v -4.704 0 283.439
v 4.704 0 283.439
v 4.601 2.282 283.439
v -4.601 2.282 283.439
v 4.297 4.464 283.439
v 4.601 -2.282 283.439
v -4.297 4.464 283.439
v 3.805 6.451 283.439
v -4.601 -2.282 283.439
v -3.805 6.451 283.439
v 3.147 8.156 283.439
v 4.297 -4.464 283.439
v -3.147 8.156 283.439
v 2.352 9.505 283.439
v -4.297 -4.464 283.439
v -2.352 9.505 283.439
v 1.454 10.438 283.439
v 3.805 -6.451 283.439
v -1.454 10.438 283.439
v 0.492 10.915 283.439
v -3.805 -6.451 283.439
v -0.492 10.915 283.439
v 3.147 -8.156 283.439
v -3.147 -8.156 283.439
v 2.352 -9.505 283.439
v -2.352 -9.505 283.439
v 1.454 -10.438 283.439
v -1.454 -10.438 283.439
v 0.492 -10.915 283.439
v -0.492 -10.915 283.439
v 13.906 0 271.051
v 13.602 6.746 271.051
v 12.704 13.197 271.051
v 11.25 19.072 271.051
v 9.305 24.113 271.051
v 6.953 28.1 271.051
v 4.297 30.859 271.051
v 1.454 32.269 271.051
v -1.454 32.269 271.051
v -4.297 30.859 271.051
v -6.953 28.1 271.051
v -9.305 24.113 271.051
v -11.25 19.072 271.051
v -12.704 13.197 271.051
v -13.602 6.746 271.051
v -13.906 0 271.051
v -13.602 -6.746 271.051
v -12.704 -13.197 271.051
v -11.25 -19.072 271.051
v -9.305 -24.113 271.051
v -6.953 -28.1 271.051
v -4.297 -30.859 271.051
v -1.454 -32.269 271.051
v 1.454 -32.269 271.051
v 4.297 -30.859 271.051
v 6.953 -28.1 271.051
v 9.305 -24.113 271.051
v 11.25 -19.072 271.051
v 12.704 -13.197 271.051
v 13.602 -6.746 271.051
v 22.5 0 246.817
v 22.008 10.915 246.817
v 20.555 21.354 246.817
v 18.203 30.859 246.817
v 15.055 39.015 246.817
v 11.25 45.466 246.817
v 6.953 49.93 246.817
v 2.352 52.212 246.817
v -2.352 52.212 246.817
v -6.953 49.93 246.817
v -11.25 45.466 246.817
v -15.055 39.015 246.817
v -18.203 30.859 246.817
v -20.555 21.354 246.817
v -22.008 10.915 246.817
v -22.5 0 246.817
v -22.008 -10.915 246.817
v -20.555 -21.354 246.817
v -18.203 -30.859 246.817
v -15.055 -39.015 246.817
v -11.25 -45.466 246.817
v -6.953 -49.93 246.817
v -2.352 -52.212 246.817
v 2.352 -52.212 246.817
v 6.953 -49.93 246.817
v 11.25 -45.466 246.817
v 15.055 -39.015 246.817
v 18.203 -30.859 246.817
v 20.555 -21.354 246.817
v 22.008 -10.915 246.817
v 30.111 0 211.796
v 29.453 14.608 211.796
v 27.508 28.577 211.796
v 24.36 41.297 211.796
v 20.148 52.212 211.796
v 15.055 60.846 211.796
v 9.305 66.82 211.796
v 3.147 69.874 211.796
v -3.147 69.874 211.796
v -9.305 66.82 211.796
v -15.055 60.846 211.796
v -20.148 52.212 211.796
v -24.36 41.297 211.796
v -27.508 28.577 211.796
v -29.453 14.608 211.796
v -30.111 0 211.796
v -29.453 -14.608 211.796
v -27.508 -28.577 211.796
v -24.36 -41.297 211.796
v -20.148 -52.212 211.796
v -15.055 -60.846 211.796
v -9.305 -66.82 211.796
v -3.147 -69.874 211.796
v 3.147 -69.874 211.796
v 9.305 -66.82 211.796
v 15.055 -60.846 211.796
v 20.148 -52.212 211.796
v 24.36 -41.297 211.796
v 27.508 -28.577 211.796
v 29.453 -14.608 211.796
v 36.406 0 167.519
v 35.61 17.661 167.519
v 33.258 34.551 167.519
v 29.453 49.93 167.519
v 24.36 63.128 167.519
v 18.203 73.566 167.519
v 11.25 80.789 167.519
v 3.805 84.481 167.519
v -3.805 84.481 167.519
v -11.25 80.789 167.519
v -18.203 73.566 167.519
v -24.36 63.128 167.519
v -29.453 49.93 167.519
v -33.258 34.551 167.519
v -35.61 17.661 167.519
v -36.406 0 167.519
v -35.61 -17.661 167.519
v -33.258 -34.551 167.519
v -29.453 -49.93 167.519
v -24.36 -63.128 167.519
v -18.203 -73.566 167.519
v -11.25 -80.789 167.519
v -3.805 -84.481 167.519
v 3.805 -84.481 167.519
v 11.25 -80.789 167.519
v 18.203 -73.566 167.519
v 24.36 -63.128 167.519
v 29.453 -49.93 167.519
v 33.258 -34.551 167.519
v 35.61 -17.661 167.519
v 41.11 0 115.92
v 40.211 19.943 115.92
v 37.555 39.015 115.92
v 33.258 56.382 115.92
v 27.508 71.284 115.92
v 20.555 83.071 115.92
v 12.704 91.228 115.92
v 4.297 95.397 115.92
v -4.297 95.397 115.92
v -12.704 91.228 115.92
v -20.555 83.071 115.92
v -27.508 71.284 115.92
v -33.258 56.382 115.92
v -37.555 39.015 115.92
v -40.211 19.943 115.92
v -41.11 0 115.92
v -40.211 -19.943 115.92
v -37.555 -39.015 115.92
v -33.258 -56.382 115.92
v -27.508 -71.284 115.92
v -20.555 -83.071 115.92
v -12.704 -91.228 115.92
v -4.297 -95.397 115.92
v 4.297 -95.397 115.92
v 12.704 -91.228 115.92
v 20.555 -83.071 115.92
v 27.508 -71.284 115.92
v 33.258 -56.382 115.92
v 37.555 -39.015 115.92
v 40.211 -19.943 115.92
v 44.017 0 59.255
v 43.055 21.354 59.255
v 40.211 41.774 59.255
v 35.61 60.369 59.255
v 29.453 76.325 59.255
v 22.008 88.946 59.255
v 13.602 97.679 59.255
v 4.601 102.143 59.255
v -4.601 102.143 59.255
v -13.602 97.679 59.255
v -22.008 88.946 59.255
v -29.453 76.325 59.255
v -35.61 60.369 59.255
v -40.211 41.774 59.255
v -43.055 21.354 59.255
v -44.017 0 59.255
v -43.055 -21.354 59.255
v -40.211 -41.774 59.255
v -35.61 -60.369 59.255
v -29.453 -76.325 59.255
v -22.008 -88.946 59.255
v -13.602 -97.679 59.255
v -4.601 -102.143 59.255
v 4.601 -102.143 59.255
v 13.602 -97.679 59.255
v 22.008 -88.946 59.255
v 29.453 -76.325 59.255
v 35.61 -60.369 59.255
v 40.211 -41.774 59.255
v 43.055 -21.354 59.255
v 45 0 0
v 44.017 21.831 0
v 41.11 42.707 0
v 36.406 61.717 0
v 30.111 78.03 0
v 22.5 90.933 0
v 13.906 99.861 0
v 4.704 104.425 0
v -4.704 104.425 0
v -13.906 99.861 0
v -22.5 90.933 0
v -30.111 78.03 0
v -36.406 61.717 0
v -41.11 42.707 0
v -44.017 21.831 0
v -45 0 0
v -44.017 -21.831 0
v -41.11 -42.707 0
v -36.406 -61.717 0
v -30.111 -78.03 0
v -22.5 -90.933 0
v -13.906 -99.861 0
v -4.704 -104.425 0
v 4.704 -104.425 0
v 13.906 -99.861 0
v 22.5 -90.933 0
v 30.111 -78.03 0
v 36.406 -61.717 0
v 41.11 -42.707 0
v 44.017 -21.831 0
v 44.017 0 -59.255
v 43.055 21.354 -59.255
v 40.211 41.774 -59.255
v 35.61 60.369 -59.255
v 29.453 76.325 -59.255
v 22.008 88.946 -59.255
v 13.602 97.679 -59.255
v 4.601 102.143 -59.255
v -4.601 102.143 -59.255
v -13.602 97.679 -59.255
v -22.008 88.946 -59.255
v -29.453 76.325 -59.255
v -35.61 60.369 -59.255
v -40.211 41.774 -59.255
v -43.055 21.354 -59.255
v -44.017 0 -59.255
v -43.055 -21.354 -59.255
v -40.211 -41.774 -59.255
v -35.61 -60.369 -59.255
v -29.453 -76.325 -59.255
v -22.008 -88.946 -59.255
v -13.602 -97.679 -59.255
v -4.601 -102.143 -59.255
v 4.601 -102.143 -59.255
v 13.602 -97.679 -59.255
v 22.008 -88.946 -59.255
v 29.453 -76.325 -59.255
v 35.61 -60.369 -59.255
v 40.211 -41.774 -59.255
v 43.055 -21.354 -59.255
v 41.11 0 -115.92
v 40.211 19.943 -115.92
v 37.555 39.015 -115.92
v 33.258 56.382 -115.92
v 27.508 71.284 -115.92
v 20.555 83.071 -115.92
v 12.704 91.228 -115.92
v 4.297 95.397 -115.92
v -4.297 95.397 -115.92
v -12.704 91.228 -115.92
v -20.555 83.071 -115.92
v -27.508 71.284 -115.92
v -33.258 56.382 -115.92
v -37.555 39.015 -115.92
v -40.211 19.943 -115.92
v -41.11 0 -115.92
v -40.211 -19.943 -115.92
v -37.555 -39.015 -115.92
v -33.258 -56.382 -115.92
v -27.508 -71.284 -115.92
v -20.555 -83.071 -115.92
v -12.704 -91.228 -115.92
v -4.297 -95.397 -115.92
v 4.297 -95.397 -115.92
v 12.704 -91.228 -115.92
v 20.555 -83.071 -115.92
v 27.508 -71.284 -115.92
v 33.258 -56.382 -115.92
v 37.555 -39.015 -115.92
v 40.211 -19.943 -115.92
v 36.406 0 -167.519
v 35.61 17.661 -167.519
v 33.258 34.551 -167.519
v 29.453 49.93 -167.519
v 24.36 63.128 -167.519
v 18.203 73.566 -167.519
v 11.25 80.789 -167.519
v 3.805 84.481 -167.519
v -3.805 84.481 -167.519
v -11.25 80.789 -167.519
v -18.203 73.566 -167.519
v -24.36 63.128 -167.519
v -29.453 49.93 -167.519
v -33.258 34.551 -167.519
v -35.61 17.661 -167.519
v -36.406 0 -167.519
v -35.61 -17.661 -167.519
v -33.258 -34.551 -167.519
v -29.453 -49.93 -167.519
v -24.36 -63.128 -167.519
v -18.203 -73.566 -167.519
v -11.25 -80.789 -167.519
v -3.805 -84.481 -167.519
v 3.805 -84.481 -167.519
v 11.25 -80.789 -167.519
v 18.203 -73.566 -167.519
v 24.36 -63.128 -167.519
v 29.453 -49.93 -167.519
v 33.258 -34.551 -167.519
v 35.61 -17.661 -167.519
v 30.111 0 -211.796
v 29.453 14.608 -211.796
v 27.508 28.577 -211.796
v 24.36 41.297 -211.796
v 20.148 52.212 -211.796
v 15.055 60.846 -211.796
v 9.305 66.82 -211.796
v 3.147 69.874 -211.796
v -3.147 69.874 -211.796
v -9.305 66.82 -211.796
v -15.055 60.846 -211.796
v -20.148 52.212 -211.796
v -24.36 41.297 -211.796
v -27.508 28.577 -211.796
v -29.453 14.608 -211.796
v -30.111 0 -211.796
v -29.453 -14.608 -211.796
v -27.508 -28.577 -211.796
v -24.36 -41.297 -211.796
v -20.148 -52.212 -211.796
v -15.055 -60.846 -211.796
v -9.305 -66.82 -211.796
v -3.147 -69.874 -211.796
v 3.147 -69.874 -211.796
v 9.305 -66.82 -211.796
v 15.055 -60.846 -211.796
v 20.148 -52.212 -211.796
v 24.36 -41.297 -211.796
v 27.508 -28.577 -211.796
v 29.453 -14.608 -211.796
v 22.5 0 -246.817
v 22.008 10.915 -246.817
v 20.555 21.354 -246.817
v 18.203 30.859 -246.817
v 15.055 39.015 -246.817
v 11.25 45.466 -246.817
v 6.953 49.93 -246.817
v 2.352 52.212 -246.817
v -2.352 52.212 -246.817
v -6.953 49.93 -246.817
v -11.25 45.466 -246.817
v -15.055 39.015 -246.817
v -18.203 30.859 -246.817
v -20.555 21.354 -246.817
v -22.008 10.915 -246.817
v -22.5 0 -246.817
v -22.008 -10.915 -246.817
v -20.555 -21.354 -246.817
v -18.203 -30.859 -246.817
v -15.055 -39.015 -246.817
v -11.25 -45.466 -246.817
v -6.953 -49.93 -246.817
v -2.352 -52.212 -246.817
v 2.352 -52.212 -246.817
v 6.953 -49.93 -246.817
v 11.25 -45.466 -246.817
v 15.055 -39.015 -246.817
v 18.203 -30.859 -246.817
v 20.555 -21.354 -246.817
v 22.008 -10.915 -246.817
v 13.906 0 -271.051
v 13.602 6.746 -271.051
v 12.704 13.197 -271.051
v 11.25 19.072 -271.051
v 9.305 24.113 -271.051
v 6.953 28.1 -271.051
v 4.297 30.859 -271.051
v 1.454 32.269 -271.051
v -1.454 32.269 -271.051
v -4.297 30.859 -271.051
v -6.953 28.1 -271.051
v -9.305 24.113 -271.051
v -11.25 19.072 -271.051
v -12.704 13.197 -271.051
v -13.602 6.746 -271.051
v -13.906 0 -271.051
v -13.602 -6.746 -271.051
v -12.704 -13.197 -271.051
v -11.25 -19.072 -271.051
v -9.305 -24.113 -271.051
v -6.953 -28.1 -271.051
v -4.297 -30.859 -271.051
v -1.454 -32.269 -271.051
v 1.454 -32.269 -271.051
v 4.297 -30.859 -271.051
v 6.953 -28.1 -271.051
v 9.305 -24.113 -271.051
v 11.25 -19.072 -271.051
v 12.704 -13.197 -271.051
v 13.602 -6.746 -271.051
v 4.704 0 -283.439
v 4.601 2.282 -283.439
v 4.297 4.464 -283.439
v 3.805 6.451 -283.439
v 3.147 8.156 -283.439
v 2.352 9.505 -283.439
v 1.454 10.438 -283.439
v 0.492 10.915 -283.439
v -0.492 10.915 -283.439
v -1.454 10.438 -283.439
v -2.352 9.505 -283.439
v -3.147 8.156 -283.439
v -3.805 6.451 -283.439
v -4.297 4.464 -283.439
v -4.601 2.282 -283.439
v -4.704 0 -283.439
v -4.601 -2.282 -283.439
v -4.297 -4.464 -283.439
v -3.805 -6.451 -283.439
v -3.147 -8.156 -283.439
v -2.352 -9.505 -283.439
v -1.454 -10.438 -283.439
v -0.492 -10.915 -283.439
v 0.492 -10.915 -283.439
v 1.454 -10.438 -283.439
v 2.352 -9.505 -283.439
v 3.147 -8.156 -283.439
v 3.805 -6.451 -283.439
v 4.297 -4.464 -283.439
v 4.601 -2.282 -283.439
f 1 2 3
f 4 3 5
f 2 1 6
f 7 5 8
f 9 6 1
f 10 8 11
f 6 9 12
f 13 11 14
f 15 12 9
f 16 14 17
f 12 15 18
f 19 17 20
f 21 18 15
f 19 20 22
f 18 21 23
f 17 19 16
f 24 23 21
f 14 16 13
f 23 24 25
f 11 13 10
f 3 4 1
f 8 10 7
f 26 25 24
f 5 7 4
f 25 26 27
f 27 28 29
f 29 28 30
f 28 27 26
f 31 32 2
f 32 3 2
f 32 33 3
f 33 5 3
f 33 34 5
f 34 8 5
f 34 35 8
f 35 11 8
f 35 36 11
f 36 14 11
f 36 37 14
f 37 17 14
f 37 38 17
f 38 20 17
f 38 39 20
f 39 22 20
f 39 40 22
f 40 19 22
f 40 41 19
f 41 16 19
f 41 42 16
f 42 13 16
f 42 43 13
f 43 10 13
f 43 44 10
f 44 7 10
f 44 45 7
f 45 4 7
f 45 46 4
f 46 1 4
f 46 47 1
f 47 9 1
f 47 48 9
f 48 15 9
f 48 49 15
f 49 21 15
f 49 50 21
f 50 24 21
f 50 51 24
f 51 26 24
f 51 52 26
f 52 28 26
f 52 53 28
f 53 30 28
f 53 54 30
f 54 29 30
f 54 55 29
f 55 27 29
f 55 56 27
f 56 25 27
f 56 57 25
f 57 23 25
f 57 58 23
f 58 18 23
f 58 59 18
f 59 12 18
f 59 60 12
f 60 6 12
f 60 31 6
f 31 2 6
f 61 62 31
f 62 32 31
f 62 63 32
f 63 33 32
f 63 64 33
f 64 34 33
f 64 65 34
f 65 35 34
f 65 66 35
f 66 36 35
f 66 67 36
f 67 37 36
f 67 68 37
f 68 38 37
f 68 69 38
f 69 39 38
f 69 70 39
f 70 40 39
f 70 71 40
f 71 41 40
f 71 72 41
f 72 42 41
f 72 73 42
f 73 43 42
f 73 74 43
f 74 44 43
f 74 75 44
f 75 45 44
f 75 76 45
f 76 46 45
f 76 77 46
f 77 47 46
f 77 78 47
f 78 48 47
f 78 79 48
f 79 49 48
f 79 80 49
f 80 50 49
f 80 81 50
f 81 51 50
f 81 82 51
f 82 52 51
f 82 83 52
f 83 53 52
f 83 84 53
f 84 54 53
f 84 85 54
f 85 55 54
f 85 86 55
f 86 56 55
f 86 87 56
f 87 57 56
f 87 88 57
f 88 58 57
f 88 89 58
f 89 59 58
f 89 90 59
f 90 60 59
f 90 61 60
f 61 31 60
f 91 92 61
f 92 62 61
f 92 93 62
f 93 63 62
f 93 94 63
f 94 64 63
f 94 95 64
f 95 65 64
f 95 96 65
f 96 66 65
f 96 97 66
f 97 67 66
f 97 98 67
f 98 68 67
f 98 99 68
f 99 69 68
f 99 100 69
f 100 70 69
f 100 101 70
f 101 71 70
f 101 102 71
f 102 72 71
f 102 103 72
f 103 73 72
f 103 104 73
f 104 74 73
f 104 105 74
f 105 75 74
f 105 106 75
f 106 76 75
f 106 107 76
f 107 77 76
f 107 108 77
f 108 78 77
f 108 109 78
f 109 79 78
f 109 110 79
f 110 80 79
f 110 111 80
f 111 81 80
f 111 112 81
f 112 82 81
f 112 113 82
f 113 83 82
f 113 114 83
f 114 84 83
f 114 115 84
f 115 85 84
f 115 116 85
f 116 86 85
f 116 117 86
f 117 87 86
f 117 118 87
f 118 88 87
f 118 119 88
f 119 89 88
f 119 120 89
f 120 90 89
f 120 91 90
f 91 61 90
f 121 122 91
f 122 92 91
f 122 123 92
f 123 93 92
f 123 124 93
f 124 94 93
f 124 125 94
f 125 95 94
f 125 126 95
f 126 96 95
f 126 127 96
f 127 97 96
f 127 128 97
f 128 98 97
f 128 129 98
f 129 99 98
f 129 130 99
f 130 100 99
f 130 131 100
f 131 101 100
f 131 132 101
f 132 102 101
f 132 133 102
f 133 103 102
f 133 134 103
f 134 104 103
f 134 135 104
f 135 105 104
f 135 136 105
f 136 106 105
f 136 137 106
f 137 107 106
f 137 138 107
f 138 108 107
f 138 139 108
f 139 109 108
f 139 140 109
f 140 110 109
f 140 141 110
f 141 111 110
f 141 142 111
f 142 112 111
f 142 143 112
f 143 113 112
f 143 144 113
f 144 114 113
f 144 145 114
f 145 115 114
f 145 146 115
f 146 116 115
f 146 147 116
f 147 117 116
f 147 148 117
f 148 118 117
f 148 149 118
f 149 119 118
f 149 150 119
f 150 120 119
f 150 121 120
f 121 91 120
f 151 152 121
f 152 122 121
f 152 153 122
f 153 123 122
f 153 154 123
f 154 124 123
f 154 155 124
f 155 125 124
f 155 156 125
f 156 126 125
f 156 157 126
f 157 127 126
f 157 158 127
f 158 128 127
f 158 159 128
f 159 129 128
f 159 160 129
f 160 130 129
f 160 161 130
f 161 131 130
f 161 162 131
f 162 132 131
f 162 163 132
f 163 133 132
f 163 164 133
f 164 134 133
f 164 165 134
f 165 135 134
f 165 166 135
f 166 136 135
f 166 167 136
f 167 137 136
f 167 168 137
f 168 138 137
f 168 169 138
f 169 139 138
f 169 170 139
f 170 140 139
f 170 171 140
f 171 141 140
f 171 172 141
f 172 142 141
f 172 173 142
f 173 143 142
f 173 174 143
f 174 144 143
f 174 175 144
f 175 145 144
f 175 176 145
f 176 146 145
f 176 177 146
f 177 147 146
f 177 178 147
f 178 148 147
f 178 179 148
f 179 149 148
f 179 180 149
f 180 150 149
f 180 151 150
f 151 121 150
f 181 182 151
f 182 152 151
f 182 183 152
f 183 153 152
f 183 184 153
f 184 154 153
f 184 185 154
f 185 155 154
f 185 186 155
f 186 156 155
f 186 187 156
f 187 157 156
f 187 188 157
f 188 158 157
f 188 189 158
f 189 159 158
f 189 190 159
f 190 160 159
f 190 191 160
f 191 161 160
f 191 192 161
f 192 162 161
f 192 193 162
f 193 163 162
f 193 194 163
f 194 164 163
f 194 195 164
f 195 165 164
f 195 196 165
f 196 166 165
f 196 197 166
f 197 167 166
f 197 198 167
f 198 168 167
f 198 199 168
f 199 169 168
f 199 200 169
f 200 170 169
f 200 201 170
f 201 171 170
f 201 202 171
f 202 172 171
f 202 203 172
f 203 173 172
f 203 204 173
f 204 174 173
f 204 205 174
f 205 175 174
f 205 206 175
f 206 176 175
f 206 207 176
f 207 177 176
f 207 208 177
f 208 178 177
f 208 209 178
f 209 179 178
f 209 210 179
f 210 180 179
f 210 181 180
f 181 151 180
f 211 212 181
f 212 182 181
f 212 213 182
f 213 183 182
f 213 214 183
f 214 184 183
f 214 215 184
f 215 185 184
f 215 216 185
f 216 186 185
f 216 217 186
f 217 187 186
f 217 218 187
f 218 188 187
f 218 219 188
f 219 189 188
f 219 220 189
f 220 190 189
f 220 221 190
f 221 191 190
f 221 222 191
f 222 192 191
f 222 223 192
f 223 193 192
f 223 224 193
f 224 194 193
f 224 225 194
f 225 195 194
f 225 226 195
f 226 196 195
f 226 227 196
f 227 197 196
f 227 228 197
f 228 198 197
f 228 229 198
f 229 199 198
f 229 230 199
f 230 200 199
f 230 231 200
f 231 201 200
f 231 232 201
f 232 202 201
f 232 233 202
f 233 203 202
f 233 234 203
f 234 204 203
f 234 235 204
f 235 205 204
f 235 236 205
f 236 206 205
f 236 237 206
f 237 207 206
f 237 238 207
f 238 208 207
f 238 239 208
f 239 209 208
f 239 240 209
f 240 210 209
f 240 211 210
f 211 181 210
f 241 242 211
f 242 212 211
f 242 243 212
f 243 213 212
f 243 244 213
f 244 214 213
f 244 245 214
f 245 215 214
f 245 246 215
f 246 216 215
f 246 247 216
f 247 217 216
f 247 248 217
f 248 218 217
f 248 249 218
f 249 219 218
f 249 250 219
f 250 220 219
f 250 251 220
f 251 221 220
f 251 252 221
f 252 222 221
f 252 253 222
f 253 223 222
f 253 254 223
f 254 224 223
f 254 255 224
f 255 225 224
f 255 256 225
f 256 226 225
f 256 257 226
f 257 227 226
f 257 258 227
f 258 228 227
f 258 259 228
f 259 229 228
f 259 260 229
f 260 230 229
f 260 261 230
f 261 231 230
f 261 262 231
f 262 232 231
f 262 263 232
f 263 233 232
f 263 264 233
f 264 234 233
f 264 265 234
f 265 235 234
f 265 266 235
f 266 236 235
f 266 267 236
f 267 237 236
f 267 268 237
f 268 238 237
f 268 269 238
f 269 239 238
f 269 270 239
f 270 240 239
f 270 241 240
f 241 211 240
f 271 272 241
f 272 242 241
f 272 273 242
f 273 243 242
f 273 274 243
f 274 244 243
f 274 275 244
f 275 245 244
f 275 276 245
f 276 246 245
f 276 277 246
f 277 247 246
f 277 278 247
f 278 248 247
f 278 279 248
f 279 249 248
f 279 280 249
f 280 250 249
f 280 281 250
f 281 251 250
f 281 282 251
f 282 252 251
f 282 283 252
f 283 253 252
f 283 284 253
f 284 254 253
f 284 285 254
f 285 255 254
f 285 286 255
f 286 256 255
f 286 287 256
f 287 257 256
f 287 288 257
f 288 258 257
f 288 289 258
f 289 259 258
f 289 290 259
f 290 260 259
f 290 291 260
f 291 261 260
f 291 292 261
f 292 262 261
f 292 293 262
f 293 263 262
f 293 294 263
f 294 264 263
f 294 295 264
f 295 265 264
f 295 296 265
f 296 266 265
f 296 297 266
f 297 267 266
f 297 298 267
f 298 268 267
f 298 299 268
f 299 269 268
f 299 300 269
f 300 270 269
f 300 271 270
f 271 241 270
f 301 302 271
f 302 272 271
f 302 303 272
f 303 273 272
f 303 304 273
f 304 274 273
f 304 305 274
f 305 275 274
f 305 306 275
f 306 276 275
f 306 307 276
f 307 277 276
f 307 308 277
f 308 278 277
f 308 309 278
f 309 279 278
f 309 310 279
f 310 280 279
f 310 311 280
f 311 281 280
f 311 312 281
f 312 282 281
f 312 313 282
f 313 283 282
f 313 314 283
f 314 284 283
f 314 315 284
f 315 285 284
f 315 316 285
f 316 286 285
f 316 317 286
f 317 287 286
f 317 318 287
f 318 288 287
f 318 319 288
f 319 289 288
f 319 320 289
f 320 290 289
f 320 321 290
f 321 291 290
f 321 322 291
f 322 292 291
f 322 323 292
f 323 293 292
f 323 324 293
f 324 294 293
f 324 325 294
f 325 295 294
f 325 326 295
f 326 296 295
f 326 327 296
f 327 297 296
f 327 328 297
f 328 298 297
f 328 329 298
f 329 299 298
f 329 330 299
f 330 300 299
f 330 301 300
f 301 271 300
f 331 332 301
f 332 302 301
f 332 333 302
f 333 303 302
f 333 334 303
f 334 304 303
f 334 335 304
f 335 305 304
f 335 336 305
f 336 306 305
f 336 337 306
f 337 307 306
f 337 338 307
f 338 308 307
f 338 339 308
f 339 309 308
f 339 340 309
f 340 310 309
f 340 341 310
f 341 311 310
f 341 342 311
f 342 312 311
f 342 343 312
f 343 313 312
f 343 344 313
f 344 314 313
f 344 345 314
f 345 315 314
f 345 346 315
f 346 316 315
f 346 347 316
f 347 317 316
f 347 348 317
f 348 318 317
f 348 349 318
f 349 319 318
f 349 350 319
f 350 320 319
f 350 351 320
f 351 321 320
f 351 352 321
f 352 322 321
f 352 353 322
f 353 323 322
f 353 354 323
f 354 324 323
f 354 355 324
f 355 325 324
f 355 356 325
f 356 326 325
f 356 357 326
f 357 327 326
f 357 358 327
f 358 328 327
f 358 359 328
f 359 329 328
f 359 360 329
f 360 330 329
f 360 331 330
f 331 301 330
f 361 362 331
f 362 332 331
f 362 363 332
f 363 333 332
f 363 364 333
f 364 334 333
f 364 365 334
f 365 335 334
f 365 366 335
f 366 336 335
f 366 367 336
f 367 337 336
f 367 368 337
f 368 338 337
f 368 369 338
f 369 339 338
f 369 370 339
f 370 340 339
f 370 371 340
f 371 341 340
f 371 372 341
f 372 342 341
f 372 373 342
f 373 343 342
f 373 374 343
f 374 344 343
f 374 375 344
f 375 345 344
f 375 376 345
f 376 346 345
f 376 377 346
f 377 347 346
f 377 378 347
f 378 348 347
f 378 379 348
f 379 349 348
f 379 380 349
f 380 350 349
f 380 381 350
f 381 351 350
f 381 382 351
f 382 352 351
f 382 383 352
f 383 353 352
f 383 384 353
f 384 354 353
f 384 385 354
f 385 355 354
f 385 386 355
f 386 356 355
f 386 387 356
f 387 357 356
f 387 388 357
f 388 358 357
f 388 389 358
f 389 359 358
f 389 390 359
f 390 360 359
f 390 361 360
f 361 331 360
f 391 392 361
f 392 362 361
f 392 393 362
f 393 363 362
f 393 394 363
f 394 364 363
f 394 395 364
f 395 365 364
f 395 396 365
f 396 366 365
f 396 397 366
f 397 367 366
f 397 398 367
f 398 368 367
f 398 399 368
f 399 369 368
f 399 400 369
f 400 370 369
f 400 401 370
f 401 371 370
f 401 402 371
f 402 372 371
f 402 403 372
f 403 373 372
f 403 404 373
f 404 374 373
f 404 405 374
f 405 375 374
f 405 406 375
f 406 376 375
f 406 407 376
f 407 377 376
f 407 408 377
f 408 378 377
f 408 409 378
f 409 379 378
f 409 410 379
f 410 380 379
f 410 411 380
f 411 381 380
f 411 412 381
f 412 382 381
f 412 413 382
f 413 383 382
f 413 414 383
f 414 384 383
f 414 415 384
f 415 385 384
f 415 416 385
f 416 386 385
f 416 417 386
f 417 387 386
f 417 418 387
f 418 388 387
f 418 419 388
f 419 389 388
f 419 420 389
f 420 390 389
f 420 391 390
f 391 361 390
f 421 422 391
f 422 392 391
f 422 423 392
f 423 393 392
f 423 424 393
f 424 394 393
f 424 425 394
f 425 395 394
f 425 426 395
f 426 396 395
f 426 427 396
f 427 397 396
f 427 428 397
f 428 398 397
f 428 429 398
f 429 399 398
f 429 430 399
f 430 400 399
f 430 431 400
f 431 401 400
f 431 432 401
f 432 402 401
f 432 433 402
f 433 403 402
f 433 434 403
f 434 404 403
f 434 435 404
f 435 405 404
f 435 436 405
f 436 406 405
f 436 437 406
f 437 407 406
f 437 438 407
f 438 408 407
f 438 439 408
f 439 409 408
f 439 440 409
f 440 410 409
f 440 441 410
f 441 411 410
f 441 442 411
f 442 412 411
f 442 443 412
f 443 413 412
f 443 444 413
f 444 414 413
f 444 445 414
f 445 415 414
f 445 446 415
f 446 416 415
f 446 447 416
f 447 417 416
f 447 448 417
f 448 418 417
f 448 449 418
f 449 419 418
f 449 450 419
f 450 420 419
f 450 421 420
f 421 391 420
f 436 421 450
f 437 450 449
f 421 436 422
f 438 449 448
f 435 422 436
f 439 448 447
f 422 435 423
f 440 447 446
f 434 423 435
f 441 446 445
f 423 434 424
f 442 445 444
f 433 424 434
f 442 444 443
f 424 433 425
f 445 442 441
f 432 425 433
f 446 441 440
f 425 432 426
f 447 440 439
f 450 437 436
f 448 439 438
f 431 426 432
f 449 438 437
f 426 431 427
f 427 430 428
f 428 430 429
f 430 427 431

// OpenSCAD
// Generated by SolidPython 1.0.1 on 2020-07-29 00:46:45


scale(v = [3, 7, 19]) {
	sphere(r = 15);
}
/***********************************************
*********      SolidPython code:      **********
************************************************
 
# import packages: SolidPython
from solid import *
from solid.utils import *
from itertools import chain, combinations, permutations


class Resize:

    def __init__(self, scad_file):
        self.scad_file = scad_file
        #self.scad_file = import_scad(scad_file)
        # cone/cylinder param:
        self.r1 = 0
        self.r2 = 0
        self.h = 0
        # rectangular prism param:
        self.w = 0
        self.l = 0
        # ellipse param:
        self.r = 0

    # import OpenScad code (file name corresponds to shape)


    # classify shape + parameters
    def assign(self, param1, param2, param3):
        if self.scad_file == 'cone.scad':
            self.r1 = param1
            self.r2 = param2
            self.h = param3
        elif self.scad_file == 'cylinder.scad':
            self.r1 = param1
            self.r2 = param2
            self.h = param3
        elif self.scad_file == 'rectangularPrism.scad':
            self.h = param1
            self.l = param2
            self.w = param3
        else:
            self.r = param1
            self.h = param2

    # resize parameters
    def iterate(self):
        x = range(3, 20, 2)
        i = 1
        if self.scad_file == 'cone.scad':
            tempList = list(permutations(x, 2))
            for temp in tempList:
                param1 = temp[0]
                param2 = temp[1]
                filepath = 'produced_scad_files/' + 'cone' + str(param1) + '_' + str(param2) + '_' + '.scad'
                scad_render_to_file(cylinder(h=param1, r1=param2, r2=0), filepath)

        elif self.scad_file == 'cylinder.scad':
            tempList = list(permutations(x, 3))
            for temp in tempList:
                param1 = temp[0]
                param2 = temp[1]
                filepath = 'produced_scad_files/' + 'cylinder' + str(param1) + '_' + str(param2) + '_' + '.scad'
                scad_render_to_file(cylinder(h=param1, r1=param2, r2=param2), filepath)

        elif self.scad_file == 'rectangularPrism.scad':
            tempList = list(permutations(x, 3))
            for temp in tempList:
                param1 = temp[0]
                param2 = temp[1]
                param3 = temp[2]
                filepath = 'produced_scad_files/' + 'rectangularPrism' + str(param1) + '_' + str(param2) + '_' + str(
                    param3) + '.scad'
                scad_render_to_file(cube(size=(param1, param2, param3)), filepath)

        elif self.scad_file == 'ellipse.scad':
            tempList = list(permutations(x, 4))
            for temp in tempList:
                param1 = temp[0]
                param2 = temp[1]
                param3 = temp[2]
                param4 = temp[3]
                filepath = 'produced_scad_files/' + 'ellipse' + str(param1) + '_' + str(param2) + '_' + str(param3) + '_' + str(param4) + '.scad'
                scad_render_to_file(scale([param1, param2, param3])(sphere(r=param4)), filepath)

    def render_to_scadfile(self):
        scad_render_to_file(scad, 'example.scad') 
 
************************************************/
